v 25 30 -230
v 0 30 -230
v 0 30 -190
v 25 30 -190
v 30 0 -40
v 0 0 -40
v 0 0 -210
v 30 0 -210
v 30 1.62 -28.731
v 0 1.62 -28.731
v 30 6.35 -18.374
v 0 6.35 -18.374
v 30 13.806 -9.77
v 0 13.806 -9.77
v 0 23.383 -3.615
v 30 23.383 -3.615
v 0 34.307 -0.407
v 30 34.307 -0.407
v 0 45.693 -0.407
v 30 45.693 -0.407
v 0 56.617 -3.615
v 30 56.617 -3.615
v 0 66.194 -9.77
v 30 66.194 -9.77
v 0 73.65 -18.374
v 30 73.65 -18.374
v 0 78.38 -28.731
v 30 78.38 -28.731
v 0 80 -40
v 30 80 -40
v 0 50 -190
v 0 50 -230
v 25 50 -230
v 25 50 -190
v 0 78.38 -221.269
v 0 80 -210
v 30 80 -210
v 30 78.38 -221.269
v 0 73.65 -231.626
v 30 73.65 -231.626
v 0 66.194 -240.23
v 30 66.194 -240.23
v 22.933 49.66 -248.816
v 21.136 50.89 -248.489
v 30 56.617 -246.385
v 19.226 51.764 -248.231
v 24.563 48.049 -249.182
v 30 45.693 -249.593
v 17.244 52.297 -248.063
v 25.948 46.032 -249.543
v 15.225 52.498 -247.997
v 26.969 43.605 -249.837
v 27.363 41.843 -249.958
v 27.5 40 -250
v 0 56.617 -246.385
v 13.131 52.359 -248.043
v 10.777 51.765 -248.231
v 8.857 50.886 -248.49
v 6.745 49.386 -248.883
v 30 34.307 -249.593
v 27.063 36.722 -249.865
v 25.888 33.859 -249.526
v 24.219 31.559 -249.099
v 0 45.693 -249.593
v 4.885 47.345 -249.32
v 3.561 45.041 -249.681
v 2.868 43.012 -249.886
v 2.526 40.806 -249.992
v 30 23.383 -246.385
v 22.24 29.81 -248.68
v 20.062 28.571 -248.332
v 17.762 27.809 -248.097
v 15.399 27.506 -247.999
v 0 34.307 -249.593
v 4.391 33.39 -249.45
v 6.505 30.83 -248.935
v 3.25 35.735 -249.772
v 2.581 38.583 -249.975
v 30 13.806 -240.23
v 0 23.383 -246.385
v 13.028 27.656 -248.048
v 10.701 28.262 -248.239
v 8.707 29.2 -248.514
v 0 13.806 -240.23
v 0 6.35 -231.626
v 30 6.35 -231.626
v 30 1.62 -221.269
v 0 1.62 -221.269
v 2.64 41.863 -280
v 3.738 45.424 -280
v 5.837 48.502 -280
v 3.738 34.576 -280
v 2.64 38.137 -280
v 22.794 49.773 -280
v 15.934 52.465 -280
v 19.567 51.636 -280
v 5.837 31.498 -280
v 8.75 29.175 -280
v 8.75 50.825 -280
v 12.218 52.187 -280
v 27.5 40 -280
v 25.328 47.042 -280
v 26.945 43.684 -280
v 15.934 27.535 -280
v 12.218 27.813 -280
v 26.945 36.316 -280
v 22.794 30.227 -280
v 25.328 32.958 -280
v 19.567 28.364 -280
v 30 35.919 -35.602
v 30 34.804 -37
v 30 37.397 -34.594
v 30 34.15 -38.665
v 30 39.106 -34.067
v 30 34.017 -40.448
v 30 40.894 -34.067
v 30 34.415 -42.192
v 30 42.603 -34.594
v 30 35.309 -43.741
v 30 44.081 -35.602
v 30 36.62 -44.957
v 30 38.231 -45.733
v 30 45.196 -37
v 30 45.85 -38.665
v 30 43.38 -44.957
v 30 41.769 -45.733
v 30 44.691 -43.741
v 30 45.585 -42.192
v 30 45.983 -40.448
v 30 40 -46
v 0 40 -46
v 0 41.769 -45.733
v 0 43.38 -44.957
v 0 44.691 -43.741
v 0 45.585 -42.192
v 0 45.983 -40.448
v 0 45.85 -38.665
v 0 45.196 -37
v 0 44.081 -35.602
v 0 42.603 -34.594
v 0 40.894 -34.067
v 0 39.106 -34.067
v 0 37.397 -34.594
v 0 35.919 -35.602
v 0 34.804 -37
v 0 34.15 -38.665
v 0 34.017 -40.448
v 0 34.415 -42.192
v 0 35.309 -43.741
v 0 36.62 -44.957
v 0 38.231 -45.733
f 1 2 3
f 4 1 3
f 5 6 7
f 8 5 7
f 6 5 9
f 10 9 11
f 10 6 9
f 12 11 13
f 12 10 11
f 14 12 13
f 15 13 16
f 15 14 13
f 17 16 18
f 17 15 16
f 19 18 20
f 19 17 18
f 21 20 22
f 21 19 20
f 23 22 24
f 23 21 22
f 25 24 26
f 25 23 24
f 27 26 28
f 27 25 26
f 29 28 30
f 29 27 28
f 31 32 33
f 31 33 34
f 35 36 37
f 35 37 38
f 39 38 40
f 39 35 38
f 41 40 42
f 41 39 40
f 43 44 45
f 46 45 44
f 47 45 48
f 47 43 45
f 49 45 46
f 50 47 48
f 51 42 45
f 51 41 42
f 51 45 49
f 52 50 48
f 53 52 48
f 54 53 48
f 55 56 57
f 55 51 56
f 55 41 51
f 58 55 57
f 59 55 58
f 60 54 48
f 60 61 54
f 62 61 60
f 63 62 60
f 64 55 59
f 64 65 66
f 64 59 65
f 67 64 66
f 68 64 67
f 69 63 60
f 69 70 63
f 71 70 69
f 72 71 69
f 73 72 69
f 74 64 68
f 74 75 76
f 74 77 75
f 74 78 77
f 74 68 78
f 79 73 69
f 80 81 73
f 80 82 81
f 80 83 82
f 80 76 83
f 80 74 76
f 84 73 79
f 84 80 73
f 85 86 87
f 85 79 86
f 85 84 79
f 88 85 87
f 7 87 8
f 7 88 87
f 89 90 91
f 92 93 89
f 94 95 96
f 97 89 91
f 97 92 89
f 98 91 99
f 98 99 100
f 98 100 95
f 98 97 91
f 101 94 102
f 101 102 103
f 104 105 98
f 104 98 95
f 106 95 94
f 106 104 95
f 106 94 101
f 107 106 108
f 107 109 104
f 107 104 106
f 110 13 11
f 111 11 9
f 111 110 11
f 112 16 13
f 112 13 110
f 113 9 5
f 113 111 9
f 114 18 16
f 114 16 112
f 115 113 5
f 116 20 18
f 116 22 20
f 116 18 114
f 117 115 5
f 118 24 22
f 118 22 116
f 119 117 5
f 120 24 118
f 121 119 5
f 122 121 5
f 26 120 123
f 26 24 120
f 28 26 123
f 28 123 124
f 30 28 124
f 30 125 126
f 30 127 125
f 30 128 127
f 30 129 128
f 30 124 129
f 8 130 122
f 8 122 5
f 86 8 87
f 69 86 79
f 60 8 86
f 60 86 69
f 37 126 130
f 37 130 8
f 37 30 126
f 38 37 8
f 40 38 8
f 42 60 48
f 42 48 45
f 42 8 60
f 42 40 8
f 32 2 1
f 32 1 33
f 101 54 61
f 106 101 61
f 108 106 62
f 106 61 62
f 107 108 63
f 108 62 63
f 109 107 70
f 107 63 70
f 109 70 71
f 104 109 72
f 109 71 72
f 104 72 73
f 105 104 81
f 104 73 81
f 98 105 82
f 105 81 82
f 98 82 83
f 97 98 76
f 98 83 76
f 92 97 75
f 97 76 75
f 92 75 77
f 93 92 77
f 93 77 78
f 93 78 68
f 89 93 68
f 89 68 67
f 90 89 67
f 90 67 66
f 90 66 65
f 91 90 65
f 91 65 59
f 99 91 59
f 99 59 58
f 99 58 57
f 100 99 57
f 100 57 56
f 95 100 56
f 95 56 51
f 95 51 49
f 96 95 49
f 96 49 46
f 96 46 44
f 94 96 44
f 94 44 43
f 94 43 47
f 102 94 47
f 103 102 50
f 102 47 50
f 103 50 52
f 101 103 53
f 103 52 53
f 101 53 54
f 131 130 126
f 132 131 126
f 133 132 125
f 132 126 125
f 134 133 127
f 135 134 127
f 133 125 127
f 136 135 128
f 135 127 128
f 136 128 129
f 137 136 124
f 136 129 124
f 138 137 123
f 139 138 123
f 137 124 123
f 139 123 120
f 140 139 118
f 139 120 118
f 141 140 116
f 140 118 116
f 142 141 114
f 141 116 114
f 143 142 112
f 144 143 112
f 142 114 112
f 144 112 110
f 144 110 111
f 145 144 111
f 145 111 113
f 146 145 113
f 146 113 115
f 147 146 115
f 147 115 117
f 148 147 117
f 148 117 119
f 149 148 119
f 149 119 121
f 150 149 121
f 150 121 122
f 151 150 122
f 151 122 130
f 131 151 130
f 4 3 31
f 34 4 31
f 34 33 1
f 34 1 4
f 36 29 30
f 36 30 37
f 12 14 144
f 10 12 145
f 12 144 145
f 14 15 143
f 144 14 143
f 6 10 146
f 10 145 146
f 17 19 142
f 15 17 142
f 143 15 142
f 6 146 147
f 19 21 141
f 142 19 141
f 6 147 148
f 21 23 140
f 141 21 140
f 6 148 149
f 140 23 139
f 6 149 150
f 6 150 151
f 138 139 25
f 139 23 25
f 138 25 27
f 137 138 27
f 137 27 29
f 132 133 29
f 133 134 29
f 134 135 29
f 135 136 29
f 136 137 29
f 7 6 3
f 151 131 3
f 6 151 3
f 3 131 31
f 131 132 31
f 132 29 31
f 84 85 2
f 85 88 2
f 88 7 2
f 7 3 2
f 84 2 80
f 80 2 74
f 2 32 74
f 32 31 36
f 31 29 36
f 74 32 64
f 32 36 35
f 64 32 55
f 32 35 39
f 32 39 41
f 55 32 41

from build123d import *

# Parameters (mm, degrees)
SKETCH2_W               = 250
SKETCH2_H               = 80
BOSS_EXTRUDE1_DEPTH     = 30
SKETCH11_R              = 6
CUT_EXTRUDE2_DEPTH      = 265.196896272
CUT_EXTRUDE_THIN2_DEPTH = 265.196896272
SKETCH15_W              = 40
SKETCH15_H              = 20
CUT_EXTRUDE3_DEPTH      = 25
SKETCH16_R              = 12.5
BOSS_EXTRUDE2_DEPTH     = 50


with BuildPart() as part:
    # Sketch2 → Boss-Extrude1 (new body)
    with BuildSketch(Plane(origin=(0, 0, 0), x_dir=(0, 0, -1), z_dir=(1, 0, 0))):
        with Locations((125, 40)):
            Rectangle(SKETCH2_W, SKETCH2_H)
    extrude(amount=BOSS_EXTRUDE1_DEPTH)

    # Sketch11 → Cut-Extrude2 (cut, through all)
    with BuildSketch(Plane(origin=(30, 0, 0), x_dir=(0, 0, -1), z_dir=(1, 0, 0))):
        with Locations((40, 40)):
            Circle(SKETCH11_R)
    extrude(amount=-CUT_EXTRUDE2_DEPTH, mode=Mode.SUBTRACT)

    # Sketch14 → Cut-Extrude-Thin2 (cut, through all)
    with BuildSketch(Plane.ZY):
        with BuildLine():
            ThreePointArc((-40, 0), (0, 40), (-40, 80))
            Line((-40, 80), (-40, 90))
            ThreePointArc((-40, 90), (10, 40), (-40, -10))
            Line((-40, -10), (-40, 0))
        make_face()
        with BuildLine():
            ThreePointArc((-210, 80), (-250, 40), (-210, 0))
            Line((-210, 0), (-210, -10))
            ThreePointArc((-210, -10), (-260, 40), (-210, 90))
            Line((-210, 90), (-210, 80))
        make_face()
    extrude(amount=-CUT_EXTRUDE_THIN2_DEPTH, mode=Mode.SUBTRACT)


with BuildPart() as cut_extrude_thin2_kept_piece:
    # of the separate pieces the step leaves, the one the design keeps (cut_extrude_thin2_pieces_kept)
    add(part.part.solids().sort_by_distance((0, 0, -40))[0])

    # Sketch15 → Cut-Extrude3 (cut)
    with BuildSketch(Plane.ZY):
        with Locations((-210, 40)):
            Rectangle(SKETCH15_W, SKETCH15_H)
    extrude(amount=-CUT_EXTRUDE3_DEPTH, mode=Mode.SUBTRACT)

    # Sketch16 → Boss-Extrude2 (add)
    with BuildSketch(Plane(origin=(0, 0, -230), x_dir=(-1, 0, 0), z_dir=(0, 0, -1))):
        with Locations(Location((-15, 40, 0), (0, 0, 180))):
            Circle(SKETCH16_R)
    extrude(amount=BOSS_EXTRUDE2_DEPTH)


solid = cut_extrude_thin2_kept_piece.part
